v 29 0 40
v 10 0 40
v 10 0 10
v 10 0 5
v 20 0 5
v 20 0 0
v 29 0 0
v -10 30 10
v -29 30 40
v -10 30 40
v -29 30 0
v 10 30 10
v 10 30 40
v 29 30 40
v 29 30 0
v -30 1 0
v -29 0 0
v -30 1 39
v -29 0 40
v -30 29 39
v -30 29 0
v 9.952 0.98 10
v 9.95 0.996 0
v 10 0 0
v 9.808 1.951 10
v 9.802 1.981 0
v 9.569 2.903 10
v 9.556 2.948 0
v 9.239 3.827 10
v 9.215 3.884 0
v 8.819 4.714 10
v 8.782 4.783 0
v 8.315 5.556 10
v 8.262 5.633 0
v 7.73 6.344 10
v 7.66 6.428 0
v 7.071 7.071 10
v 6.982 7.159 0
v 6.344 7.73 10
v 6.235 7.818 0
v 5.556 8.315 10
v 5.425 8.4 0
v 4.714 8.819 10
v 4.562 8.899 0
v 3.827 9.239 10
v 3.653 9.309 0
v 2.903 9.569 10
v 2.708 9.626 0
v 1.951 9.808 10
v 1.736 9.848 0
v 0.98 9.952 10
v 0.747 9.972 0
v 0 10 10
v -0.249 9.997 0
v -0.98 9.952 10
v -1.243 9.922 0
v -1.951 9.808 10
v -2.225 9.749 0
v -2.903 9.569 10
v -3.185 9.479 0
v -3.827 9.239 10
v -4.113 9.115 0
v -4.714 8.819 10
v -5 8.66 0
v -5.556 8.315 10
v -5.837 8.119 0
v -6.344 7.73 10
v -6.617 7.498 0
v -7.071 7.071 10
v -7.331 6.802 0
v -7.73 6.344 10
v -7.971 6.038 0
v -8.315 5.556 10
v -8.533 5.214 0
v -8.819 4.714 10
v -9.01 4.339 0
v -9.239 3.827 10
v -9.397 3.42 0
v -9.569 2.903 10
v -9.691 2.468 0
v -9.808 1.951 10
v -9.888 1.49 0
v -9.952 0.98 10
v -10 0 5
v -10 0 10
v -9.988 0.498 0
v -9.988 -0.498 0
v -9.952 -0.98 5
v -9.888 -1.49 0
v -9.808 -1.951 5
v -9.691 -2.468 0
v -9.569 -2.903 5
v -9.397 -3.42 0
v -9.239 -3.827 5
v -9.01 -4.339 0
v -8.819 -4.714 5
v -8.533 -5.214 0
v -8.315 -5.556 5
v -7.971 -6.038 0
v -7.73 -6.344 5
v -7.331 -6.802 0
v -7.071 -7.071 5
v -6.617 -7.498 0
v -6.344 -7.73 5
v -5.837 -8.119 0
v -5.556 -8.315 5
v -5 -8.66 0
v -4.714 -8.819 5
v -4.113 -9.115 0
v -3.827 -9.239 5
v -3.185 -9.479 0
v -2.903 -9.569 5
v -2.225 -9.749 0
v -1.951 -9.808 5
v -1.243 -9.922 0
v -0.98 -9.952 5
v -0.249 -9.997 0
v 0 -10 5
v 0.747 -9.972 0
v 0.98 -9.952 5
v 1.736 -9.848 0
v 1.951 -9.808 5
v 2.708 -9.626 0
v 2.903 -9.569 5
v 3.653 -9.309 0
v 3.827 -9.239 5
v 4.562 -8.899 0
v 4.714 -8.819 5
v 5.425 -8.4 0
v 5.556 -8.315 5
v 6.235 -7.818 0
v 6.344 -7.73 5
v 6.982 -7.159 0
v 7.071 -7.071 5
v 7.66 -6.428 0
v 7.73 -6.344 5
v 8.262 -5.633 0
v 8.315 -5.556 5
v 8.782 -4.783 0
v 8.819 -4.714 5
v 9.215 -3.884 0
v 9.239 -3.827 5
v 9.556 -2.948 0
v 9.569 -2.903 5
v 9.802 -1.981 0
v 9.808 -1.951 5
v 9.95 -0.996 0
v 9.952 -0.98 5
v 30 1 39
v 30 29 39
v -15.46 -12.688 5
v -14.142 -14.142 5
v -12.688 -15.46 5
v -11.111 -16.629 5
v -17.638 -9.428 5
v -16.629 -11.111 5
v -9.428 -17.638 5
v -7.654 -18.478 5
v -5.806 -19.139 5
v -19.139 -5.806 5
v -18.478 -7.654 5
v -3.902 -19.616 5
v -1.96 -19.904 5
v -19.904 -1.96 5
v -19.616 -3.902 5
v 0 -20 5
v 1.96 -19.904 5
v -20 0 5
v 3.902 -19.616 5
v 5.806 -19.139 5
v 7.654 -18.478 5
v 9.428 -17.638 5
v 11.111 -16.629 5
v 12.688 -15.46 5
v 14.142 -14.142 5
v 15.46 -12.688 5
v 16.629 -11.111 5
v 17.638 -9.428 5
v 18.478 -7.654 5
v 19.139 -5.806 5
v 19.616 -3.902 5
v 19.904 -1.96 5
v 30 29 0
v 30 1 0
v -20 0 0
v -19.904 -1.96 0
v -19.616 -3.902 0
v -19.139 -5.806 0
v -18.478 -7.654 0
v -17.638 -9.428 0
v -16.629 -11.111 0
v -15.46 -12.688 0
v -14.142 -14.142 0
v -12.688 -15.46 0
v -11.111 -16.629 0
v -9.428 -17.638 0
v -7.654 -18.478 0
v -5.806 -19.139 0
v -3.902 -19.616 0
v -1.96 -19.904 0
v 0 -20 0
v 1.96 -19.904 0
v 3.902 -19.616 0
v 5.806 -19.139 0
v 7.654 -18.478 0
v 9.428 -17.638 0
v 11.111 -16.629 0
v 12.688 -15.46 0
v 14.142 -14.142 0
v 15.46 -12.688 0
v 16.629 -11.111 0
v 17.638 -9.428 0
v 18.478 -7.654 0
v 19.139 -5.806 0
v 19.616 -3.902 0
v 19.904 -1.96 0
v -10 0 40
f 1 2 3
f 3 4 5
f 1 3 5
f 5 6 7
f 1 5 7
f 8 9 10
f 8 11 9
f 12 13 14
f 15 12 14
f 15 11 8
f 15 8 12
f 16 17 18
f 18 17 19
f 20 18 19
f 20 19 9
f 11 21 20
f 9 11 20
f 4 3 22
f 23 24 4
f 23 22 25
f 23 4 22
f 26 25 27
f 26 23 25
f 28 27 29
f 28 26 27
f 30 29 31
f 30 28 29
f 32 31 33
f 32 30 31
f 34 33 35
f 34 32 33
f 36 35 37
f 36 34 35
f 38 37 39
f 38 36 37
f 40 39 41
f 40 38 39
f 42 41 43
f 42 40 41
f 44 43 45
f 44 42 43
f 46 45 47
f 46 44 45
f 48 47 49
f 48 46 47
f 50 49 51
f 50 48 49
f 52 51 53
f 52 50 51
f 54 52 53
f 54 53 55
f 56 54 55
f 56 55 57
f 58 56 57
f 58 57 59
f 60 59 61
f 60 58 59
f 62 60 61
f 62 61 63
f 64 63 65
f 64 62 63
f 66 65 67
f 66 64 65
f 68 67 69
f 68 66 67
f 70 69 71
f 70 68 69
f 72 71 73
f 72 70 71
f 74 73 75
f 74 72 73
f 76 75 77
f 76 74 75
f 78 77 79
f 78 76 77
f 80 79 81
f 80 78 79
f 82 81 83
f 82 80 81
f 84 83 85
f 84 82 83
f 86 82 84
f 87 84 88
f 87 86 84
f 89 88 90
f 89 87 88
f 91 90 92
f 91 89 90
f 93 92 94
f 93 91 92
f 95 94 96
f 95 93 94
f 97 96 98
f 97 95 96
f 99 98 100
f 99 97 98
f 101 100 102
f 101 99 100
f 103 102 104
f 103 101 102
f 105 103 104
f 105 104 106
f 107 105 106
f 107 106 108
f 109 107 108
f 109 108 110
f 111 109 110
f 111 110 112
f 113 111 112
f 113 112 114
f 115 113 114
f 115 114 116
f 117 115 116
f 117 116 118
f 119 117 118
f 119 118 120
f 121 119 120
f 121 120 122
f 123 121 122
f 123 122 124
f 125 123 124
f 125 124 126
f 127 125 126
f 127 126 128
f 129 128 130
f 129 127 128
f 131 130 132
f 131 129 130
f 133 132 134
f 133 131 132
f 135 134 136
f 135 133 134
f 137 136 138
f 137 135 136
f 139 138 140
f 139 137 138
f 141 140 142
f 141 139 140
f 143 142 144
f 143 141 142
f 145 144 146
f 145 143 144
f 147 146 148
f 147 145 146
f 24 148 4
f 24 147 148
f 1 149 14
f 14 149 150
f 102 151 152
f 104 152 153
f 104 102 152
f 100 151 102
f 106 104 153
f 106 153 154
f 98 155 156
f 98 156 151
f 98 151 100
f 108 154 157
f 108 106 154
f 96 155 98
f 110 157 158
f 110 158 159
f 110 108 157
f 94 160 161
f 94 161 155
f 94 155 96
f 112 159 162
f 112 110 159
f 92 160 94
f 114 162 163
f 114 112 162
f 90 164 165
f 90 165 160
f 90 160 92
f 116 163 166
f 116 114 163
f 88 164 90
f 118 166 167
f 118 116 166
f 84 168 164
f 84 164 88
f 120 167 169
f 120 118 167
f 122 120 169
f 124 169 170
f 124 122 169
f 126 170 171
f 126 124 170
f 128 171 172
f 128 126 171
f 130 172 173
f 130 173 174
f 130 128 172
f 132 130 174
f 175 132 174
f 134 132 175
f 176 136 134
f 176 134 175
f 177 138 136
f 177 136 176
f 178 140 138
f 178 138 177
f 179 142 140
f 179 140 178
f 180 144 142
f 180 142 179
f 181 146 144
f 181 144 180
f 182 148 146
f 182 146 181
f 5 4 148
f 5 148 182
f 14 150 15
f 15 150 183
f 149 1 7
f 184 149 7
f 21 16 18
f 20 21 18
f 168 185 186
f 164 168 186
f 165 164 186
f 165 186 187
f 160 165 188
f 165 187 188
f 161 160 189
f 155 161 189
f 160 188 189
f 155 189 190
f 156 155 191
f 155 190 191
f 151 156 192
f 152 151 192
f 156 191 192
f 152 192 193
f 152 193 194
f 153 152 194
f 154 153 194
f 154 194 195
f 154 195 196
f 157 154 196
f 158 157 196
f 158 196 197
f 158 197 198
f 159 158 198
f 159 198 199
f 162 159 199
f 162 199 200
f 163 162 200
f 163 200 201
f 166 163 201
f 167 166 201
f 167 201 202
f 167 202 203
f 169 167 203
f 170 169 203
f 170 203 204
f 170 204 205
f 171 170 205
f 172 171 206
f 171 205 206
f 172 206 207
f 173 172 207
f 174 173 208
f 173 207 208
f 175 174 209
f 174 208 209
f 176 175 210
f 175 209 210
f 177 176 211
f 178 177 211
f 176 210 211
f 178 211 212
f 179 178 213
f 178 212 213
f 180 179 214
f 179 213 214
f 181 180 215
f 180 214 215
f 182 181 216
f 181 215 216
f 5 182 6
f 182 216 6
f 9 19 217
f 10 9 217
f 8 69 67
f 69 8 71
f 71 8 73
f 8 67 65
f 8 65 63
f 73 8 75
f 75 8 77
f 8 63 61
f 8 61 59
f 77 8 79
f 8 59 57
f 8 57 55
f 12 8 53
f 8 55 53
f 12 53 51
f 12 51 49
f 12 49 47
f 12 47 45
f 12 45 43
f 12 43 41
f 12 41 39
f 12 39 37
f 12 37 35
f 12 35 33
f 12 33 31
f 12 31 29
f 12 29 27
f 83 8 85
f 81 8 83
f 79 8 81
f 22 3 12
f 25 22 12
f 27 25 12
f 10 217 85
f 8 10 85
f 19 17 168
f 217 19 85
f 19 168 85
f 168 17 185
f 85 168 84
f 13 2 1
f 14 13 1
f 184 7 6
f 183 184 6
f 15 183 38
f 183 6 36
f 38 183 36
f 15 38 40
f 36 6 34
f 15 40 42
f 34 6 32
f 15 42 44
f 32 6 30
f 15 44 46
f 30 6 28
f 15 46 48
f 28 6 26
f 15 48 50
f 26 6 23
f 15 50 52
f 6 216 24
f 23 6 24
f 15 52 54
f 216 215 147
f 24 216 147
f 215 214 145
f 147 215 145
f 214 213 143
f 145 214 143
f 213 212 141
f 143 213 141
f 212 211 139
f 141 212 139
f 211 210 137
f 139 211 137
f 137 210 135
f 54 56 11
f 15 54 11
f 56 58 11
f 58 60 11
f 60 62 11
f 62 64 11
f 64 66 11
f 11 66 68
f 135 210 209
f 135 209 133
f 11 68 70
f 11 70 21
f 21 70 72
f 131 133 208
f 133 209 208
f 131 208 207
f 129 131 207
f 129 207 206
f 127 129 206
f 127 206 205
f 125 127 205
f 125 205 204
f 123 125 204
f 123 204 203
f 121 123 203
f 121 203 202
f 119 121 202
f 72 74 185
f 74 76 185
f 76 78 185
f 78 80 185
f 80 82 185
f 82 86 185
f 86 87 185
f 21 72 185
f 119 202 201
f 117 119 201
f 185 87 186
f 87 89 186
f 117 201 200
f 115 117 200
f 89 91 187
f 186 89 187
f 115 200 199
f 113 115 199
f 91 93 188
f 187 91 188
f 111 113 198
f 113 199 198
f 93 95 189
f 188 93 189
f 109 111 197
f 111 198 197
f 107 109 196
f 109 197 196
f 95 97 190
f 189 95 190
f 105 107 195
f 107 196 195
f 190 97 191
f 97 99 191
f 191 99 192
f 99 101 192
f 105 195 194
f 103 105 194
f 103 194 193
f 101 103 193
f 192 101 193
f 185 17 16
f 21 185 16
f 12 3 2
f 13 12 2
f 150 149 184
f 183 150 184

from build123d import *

# Parameters (mm, degrees)
BOSS_EXTRUDE1_DEPTH = 30
SKETCH2_R           = 20
BOSS_EXTRUDE2_DEPTH = 5
SKETCH3_R           = 10
CUT_EXTRUDE1_DEPTH  = 20
CHAMFER1_SIZE       = 1


with BuildPart() as part:
    # Sketch1 → Boss-Extrude1 (new body)
    with BuildSketch(Plane(origin=(0, 0, 0), x_dir=(1, 0, 0), z_dir=(0, 1, 0))):
        Polygon((-30, 0), (-30, -40), (-10, -40), (-10, -10), (10, -10), (10, -40), (30, -40), (30, 0), align=None)
    extrude(amount=BOSS_EXTRUDE1_DEPTH)

    # Sketch2 → Boss-Extrude2 (add)
    with BuildSketch(Plane.XY):
        Circle(SKETCH2_R)
    extrude(amount=BOSS_EXTRUDE2_DEPTH)

    # Sketch3 → Cut-Extrude1 (cut)
    with BuildSketch(Plane.XY):
        Circle(SKETCH3_R)
    extrude(amount=CUT_EXTRUDE1_DEPTH, mode=Mode.SUBTRACT)

    # Chamfer1
    chamfer1_edges = [part.edges().sort_by_distance(p)[0] for p in [
        (-30, 0, 20),
        (30, 15, 40),
        (-30, 15, 40),
        (30, 30, 20),
        (30, 0, 20),
        (-30, 30, 20),
    ]]
    chamfer(chamfer1_edges, length=CHAMFER1_SIZE)


solid = part.part
